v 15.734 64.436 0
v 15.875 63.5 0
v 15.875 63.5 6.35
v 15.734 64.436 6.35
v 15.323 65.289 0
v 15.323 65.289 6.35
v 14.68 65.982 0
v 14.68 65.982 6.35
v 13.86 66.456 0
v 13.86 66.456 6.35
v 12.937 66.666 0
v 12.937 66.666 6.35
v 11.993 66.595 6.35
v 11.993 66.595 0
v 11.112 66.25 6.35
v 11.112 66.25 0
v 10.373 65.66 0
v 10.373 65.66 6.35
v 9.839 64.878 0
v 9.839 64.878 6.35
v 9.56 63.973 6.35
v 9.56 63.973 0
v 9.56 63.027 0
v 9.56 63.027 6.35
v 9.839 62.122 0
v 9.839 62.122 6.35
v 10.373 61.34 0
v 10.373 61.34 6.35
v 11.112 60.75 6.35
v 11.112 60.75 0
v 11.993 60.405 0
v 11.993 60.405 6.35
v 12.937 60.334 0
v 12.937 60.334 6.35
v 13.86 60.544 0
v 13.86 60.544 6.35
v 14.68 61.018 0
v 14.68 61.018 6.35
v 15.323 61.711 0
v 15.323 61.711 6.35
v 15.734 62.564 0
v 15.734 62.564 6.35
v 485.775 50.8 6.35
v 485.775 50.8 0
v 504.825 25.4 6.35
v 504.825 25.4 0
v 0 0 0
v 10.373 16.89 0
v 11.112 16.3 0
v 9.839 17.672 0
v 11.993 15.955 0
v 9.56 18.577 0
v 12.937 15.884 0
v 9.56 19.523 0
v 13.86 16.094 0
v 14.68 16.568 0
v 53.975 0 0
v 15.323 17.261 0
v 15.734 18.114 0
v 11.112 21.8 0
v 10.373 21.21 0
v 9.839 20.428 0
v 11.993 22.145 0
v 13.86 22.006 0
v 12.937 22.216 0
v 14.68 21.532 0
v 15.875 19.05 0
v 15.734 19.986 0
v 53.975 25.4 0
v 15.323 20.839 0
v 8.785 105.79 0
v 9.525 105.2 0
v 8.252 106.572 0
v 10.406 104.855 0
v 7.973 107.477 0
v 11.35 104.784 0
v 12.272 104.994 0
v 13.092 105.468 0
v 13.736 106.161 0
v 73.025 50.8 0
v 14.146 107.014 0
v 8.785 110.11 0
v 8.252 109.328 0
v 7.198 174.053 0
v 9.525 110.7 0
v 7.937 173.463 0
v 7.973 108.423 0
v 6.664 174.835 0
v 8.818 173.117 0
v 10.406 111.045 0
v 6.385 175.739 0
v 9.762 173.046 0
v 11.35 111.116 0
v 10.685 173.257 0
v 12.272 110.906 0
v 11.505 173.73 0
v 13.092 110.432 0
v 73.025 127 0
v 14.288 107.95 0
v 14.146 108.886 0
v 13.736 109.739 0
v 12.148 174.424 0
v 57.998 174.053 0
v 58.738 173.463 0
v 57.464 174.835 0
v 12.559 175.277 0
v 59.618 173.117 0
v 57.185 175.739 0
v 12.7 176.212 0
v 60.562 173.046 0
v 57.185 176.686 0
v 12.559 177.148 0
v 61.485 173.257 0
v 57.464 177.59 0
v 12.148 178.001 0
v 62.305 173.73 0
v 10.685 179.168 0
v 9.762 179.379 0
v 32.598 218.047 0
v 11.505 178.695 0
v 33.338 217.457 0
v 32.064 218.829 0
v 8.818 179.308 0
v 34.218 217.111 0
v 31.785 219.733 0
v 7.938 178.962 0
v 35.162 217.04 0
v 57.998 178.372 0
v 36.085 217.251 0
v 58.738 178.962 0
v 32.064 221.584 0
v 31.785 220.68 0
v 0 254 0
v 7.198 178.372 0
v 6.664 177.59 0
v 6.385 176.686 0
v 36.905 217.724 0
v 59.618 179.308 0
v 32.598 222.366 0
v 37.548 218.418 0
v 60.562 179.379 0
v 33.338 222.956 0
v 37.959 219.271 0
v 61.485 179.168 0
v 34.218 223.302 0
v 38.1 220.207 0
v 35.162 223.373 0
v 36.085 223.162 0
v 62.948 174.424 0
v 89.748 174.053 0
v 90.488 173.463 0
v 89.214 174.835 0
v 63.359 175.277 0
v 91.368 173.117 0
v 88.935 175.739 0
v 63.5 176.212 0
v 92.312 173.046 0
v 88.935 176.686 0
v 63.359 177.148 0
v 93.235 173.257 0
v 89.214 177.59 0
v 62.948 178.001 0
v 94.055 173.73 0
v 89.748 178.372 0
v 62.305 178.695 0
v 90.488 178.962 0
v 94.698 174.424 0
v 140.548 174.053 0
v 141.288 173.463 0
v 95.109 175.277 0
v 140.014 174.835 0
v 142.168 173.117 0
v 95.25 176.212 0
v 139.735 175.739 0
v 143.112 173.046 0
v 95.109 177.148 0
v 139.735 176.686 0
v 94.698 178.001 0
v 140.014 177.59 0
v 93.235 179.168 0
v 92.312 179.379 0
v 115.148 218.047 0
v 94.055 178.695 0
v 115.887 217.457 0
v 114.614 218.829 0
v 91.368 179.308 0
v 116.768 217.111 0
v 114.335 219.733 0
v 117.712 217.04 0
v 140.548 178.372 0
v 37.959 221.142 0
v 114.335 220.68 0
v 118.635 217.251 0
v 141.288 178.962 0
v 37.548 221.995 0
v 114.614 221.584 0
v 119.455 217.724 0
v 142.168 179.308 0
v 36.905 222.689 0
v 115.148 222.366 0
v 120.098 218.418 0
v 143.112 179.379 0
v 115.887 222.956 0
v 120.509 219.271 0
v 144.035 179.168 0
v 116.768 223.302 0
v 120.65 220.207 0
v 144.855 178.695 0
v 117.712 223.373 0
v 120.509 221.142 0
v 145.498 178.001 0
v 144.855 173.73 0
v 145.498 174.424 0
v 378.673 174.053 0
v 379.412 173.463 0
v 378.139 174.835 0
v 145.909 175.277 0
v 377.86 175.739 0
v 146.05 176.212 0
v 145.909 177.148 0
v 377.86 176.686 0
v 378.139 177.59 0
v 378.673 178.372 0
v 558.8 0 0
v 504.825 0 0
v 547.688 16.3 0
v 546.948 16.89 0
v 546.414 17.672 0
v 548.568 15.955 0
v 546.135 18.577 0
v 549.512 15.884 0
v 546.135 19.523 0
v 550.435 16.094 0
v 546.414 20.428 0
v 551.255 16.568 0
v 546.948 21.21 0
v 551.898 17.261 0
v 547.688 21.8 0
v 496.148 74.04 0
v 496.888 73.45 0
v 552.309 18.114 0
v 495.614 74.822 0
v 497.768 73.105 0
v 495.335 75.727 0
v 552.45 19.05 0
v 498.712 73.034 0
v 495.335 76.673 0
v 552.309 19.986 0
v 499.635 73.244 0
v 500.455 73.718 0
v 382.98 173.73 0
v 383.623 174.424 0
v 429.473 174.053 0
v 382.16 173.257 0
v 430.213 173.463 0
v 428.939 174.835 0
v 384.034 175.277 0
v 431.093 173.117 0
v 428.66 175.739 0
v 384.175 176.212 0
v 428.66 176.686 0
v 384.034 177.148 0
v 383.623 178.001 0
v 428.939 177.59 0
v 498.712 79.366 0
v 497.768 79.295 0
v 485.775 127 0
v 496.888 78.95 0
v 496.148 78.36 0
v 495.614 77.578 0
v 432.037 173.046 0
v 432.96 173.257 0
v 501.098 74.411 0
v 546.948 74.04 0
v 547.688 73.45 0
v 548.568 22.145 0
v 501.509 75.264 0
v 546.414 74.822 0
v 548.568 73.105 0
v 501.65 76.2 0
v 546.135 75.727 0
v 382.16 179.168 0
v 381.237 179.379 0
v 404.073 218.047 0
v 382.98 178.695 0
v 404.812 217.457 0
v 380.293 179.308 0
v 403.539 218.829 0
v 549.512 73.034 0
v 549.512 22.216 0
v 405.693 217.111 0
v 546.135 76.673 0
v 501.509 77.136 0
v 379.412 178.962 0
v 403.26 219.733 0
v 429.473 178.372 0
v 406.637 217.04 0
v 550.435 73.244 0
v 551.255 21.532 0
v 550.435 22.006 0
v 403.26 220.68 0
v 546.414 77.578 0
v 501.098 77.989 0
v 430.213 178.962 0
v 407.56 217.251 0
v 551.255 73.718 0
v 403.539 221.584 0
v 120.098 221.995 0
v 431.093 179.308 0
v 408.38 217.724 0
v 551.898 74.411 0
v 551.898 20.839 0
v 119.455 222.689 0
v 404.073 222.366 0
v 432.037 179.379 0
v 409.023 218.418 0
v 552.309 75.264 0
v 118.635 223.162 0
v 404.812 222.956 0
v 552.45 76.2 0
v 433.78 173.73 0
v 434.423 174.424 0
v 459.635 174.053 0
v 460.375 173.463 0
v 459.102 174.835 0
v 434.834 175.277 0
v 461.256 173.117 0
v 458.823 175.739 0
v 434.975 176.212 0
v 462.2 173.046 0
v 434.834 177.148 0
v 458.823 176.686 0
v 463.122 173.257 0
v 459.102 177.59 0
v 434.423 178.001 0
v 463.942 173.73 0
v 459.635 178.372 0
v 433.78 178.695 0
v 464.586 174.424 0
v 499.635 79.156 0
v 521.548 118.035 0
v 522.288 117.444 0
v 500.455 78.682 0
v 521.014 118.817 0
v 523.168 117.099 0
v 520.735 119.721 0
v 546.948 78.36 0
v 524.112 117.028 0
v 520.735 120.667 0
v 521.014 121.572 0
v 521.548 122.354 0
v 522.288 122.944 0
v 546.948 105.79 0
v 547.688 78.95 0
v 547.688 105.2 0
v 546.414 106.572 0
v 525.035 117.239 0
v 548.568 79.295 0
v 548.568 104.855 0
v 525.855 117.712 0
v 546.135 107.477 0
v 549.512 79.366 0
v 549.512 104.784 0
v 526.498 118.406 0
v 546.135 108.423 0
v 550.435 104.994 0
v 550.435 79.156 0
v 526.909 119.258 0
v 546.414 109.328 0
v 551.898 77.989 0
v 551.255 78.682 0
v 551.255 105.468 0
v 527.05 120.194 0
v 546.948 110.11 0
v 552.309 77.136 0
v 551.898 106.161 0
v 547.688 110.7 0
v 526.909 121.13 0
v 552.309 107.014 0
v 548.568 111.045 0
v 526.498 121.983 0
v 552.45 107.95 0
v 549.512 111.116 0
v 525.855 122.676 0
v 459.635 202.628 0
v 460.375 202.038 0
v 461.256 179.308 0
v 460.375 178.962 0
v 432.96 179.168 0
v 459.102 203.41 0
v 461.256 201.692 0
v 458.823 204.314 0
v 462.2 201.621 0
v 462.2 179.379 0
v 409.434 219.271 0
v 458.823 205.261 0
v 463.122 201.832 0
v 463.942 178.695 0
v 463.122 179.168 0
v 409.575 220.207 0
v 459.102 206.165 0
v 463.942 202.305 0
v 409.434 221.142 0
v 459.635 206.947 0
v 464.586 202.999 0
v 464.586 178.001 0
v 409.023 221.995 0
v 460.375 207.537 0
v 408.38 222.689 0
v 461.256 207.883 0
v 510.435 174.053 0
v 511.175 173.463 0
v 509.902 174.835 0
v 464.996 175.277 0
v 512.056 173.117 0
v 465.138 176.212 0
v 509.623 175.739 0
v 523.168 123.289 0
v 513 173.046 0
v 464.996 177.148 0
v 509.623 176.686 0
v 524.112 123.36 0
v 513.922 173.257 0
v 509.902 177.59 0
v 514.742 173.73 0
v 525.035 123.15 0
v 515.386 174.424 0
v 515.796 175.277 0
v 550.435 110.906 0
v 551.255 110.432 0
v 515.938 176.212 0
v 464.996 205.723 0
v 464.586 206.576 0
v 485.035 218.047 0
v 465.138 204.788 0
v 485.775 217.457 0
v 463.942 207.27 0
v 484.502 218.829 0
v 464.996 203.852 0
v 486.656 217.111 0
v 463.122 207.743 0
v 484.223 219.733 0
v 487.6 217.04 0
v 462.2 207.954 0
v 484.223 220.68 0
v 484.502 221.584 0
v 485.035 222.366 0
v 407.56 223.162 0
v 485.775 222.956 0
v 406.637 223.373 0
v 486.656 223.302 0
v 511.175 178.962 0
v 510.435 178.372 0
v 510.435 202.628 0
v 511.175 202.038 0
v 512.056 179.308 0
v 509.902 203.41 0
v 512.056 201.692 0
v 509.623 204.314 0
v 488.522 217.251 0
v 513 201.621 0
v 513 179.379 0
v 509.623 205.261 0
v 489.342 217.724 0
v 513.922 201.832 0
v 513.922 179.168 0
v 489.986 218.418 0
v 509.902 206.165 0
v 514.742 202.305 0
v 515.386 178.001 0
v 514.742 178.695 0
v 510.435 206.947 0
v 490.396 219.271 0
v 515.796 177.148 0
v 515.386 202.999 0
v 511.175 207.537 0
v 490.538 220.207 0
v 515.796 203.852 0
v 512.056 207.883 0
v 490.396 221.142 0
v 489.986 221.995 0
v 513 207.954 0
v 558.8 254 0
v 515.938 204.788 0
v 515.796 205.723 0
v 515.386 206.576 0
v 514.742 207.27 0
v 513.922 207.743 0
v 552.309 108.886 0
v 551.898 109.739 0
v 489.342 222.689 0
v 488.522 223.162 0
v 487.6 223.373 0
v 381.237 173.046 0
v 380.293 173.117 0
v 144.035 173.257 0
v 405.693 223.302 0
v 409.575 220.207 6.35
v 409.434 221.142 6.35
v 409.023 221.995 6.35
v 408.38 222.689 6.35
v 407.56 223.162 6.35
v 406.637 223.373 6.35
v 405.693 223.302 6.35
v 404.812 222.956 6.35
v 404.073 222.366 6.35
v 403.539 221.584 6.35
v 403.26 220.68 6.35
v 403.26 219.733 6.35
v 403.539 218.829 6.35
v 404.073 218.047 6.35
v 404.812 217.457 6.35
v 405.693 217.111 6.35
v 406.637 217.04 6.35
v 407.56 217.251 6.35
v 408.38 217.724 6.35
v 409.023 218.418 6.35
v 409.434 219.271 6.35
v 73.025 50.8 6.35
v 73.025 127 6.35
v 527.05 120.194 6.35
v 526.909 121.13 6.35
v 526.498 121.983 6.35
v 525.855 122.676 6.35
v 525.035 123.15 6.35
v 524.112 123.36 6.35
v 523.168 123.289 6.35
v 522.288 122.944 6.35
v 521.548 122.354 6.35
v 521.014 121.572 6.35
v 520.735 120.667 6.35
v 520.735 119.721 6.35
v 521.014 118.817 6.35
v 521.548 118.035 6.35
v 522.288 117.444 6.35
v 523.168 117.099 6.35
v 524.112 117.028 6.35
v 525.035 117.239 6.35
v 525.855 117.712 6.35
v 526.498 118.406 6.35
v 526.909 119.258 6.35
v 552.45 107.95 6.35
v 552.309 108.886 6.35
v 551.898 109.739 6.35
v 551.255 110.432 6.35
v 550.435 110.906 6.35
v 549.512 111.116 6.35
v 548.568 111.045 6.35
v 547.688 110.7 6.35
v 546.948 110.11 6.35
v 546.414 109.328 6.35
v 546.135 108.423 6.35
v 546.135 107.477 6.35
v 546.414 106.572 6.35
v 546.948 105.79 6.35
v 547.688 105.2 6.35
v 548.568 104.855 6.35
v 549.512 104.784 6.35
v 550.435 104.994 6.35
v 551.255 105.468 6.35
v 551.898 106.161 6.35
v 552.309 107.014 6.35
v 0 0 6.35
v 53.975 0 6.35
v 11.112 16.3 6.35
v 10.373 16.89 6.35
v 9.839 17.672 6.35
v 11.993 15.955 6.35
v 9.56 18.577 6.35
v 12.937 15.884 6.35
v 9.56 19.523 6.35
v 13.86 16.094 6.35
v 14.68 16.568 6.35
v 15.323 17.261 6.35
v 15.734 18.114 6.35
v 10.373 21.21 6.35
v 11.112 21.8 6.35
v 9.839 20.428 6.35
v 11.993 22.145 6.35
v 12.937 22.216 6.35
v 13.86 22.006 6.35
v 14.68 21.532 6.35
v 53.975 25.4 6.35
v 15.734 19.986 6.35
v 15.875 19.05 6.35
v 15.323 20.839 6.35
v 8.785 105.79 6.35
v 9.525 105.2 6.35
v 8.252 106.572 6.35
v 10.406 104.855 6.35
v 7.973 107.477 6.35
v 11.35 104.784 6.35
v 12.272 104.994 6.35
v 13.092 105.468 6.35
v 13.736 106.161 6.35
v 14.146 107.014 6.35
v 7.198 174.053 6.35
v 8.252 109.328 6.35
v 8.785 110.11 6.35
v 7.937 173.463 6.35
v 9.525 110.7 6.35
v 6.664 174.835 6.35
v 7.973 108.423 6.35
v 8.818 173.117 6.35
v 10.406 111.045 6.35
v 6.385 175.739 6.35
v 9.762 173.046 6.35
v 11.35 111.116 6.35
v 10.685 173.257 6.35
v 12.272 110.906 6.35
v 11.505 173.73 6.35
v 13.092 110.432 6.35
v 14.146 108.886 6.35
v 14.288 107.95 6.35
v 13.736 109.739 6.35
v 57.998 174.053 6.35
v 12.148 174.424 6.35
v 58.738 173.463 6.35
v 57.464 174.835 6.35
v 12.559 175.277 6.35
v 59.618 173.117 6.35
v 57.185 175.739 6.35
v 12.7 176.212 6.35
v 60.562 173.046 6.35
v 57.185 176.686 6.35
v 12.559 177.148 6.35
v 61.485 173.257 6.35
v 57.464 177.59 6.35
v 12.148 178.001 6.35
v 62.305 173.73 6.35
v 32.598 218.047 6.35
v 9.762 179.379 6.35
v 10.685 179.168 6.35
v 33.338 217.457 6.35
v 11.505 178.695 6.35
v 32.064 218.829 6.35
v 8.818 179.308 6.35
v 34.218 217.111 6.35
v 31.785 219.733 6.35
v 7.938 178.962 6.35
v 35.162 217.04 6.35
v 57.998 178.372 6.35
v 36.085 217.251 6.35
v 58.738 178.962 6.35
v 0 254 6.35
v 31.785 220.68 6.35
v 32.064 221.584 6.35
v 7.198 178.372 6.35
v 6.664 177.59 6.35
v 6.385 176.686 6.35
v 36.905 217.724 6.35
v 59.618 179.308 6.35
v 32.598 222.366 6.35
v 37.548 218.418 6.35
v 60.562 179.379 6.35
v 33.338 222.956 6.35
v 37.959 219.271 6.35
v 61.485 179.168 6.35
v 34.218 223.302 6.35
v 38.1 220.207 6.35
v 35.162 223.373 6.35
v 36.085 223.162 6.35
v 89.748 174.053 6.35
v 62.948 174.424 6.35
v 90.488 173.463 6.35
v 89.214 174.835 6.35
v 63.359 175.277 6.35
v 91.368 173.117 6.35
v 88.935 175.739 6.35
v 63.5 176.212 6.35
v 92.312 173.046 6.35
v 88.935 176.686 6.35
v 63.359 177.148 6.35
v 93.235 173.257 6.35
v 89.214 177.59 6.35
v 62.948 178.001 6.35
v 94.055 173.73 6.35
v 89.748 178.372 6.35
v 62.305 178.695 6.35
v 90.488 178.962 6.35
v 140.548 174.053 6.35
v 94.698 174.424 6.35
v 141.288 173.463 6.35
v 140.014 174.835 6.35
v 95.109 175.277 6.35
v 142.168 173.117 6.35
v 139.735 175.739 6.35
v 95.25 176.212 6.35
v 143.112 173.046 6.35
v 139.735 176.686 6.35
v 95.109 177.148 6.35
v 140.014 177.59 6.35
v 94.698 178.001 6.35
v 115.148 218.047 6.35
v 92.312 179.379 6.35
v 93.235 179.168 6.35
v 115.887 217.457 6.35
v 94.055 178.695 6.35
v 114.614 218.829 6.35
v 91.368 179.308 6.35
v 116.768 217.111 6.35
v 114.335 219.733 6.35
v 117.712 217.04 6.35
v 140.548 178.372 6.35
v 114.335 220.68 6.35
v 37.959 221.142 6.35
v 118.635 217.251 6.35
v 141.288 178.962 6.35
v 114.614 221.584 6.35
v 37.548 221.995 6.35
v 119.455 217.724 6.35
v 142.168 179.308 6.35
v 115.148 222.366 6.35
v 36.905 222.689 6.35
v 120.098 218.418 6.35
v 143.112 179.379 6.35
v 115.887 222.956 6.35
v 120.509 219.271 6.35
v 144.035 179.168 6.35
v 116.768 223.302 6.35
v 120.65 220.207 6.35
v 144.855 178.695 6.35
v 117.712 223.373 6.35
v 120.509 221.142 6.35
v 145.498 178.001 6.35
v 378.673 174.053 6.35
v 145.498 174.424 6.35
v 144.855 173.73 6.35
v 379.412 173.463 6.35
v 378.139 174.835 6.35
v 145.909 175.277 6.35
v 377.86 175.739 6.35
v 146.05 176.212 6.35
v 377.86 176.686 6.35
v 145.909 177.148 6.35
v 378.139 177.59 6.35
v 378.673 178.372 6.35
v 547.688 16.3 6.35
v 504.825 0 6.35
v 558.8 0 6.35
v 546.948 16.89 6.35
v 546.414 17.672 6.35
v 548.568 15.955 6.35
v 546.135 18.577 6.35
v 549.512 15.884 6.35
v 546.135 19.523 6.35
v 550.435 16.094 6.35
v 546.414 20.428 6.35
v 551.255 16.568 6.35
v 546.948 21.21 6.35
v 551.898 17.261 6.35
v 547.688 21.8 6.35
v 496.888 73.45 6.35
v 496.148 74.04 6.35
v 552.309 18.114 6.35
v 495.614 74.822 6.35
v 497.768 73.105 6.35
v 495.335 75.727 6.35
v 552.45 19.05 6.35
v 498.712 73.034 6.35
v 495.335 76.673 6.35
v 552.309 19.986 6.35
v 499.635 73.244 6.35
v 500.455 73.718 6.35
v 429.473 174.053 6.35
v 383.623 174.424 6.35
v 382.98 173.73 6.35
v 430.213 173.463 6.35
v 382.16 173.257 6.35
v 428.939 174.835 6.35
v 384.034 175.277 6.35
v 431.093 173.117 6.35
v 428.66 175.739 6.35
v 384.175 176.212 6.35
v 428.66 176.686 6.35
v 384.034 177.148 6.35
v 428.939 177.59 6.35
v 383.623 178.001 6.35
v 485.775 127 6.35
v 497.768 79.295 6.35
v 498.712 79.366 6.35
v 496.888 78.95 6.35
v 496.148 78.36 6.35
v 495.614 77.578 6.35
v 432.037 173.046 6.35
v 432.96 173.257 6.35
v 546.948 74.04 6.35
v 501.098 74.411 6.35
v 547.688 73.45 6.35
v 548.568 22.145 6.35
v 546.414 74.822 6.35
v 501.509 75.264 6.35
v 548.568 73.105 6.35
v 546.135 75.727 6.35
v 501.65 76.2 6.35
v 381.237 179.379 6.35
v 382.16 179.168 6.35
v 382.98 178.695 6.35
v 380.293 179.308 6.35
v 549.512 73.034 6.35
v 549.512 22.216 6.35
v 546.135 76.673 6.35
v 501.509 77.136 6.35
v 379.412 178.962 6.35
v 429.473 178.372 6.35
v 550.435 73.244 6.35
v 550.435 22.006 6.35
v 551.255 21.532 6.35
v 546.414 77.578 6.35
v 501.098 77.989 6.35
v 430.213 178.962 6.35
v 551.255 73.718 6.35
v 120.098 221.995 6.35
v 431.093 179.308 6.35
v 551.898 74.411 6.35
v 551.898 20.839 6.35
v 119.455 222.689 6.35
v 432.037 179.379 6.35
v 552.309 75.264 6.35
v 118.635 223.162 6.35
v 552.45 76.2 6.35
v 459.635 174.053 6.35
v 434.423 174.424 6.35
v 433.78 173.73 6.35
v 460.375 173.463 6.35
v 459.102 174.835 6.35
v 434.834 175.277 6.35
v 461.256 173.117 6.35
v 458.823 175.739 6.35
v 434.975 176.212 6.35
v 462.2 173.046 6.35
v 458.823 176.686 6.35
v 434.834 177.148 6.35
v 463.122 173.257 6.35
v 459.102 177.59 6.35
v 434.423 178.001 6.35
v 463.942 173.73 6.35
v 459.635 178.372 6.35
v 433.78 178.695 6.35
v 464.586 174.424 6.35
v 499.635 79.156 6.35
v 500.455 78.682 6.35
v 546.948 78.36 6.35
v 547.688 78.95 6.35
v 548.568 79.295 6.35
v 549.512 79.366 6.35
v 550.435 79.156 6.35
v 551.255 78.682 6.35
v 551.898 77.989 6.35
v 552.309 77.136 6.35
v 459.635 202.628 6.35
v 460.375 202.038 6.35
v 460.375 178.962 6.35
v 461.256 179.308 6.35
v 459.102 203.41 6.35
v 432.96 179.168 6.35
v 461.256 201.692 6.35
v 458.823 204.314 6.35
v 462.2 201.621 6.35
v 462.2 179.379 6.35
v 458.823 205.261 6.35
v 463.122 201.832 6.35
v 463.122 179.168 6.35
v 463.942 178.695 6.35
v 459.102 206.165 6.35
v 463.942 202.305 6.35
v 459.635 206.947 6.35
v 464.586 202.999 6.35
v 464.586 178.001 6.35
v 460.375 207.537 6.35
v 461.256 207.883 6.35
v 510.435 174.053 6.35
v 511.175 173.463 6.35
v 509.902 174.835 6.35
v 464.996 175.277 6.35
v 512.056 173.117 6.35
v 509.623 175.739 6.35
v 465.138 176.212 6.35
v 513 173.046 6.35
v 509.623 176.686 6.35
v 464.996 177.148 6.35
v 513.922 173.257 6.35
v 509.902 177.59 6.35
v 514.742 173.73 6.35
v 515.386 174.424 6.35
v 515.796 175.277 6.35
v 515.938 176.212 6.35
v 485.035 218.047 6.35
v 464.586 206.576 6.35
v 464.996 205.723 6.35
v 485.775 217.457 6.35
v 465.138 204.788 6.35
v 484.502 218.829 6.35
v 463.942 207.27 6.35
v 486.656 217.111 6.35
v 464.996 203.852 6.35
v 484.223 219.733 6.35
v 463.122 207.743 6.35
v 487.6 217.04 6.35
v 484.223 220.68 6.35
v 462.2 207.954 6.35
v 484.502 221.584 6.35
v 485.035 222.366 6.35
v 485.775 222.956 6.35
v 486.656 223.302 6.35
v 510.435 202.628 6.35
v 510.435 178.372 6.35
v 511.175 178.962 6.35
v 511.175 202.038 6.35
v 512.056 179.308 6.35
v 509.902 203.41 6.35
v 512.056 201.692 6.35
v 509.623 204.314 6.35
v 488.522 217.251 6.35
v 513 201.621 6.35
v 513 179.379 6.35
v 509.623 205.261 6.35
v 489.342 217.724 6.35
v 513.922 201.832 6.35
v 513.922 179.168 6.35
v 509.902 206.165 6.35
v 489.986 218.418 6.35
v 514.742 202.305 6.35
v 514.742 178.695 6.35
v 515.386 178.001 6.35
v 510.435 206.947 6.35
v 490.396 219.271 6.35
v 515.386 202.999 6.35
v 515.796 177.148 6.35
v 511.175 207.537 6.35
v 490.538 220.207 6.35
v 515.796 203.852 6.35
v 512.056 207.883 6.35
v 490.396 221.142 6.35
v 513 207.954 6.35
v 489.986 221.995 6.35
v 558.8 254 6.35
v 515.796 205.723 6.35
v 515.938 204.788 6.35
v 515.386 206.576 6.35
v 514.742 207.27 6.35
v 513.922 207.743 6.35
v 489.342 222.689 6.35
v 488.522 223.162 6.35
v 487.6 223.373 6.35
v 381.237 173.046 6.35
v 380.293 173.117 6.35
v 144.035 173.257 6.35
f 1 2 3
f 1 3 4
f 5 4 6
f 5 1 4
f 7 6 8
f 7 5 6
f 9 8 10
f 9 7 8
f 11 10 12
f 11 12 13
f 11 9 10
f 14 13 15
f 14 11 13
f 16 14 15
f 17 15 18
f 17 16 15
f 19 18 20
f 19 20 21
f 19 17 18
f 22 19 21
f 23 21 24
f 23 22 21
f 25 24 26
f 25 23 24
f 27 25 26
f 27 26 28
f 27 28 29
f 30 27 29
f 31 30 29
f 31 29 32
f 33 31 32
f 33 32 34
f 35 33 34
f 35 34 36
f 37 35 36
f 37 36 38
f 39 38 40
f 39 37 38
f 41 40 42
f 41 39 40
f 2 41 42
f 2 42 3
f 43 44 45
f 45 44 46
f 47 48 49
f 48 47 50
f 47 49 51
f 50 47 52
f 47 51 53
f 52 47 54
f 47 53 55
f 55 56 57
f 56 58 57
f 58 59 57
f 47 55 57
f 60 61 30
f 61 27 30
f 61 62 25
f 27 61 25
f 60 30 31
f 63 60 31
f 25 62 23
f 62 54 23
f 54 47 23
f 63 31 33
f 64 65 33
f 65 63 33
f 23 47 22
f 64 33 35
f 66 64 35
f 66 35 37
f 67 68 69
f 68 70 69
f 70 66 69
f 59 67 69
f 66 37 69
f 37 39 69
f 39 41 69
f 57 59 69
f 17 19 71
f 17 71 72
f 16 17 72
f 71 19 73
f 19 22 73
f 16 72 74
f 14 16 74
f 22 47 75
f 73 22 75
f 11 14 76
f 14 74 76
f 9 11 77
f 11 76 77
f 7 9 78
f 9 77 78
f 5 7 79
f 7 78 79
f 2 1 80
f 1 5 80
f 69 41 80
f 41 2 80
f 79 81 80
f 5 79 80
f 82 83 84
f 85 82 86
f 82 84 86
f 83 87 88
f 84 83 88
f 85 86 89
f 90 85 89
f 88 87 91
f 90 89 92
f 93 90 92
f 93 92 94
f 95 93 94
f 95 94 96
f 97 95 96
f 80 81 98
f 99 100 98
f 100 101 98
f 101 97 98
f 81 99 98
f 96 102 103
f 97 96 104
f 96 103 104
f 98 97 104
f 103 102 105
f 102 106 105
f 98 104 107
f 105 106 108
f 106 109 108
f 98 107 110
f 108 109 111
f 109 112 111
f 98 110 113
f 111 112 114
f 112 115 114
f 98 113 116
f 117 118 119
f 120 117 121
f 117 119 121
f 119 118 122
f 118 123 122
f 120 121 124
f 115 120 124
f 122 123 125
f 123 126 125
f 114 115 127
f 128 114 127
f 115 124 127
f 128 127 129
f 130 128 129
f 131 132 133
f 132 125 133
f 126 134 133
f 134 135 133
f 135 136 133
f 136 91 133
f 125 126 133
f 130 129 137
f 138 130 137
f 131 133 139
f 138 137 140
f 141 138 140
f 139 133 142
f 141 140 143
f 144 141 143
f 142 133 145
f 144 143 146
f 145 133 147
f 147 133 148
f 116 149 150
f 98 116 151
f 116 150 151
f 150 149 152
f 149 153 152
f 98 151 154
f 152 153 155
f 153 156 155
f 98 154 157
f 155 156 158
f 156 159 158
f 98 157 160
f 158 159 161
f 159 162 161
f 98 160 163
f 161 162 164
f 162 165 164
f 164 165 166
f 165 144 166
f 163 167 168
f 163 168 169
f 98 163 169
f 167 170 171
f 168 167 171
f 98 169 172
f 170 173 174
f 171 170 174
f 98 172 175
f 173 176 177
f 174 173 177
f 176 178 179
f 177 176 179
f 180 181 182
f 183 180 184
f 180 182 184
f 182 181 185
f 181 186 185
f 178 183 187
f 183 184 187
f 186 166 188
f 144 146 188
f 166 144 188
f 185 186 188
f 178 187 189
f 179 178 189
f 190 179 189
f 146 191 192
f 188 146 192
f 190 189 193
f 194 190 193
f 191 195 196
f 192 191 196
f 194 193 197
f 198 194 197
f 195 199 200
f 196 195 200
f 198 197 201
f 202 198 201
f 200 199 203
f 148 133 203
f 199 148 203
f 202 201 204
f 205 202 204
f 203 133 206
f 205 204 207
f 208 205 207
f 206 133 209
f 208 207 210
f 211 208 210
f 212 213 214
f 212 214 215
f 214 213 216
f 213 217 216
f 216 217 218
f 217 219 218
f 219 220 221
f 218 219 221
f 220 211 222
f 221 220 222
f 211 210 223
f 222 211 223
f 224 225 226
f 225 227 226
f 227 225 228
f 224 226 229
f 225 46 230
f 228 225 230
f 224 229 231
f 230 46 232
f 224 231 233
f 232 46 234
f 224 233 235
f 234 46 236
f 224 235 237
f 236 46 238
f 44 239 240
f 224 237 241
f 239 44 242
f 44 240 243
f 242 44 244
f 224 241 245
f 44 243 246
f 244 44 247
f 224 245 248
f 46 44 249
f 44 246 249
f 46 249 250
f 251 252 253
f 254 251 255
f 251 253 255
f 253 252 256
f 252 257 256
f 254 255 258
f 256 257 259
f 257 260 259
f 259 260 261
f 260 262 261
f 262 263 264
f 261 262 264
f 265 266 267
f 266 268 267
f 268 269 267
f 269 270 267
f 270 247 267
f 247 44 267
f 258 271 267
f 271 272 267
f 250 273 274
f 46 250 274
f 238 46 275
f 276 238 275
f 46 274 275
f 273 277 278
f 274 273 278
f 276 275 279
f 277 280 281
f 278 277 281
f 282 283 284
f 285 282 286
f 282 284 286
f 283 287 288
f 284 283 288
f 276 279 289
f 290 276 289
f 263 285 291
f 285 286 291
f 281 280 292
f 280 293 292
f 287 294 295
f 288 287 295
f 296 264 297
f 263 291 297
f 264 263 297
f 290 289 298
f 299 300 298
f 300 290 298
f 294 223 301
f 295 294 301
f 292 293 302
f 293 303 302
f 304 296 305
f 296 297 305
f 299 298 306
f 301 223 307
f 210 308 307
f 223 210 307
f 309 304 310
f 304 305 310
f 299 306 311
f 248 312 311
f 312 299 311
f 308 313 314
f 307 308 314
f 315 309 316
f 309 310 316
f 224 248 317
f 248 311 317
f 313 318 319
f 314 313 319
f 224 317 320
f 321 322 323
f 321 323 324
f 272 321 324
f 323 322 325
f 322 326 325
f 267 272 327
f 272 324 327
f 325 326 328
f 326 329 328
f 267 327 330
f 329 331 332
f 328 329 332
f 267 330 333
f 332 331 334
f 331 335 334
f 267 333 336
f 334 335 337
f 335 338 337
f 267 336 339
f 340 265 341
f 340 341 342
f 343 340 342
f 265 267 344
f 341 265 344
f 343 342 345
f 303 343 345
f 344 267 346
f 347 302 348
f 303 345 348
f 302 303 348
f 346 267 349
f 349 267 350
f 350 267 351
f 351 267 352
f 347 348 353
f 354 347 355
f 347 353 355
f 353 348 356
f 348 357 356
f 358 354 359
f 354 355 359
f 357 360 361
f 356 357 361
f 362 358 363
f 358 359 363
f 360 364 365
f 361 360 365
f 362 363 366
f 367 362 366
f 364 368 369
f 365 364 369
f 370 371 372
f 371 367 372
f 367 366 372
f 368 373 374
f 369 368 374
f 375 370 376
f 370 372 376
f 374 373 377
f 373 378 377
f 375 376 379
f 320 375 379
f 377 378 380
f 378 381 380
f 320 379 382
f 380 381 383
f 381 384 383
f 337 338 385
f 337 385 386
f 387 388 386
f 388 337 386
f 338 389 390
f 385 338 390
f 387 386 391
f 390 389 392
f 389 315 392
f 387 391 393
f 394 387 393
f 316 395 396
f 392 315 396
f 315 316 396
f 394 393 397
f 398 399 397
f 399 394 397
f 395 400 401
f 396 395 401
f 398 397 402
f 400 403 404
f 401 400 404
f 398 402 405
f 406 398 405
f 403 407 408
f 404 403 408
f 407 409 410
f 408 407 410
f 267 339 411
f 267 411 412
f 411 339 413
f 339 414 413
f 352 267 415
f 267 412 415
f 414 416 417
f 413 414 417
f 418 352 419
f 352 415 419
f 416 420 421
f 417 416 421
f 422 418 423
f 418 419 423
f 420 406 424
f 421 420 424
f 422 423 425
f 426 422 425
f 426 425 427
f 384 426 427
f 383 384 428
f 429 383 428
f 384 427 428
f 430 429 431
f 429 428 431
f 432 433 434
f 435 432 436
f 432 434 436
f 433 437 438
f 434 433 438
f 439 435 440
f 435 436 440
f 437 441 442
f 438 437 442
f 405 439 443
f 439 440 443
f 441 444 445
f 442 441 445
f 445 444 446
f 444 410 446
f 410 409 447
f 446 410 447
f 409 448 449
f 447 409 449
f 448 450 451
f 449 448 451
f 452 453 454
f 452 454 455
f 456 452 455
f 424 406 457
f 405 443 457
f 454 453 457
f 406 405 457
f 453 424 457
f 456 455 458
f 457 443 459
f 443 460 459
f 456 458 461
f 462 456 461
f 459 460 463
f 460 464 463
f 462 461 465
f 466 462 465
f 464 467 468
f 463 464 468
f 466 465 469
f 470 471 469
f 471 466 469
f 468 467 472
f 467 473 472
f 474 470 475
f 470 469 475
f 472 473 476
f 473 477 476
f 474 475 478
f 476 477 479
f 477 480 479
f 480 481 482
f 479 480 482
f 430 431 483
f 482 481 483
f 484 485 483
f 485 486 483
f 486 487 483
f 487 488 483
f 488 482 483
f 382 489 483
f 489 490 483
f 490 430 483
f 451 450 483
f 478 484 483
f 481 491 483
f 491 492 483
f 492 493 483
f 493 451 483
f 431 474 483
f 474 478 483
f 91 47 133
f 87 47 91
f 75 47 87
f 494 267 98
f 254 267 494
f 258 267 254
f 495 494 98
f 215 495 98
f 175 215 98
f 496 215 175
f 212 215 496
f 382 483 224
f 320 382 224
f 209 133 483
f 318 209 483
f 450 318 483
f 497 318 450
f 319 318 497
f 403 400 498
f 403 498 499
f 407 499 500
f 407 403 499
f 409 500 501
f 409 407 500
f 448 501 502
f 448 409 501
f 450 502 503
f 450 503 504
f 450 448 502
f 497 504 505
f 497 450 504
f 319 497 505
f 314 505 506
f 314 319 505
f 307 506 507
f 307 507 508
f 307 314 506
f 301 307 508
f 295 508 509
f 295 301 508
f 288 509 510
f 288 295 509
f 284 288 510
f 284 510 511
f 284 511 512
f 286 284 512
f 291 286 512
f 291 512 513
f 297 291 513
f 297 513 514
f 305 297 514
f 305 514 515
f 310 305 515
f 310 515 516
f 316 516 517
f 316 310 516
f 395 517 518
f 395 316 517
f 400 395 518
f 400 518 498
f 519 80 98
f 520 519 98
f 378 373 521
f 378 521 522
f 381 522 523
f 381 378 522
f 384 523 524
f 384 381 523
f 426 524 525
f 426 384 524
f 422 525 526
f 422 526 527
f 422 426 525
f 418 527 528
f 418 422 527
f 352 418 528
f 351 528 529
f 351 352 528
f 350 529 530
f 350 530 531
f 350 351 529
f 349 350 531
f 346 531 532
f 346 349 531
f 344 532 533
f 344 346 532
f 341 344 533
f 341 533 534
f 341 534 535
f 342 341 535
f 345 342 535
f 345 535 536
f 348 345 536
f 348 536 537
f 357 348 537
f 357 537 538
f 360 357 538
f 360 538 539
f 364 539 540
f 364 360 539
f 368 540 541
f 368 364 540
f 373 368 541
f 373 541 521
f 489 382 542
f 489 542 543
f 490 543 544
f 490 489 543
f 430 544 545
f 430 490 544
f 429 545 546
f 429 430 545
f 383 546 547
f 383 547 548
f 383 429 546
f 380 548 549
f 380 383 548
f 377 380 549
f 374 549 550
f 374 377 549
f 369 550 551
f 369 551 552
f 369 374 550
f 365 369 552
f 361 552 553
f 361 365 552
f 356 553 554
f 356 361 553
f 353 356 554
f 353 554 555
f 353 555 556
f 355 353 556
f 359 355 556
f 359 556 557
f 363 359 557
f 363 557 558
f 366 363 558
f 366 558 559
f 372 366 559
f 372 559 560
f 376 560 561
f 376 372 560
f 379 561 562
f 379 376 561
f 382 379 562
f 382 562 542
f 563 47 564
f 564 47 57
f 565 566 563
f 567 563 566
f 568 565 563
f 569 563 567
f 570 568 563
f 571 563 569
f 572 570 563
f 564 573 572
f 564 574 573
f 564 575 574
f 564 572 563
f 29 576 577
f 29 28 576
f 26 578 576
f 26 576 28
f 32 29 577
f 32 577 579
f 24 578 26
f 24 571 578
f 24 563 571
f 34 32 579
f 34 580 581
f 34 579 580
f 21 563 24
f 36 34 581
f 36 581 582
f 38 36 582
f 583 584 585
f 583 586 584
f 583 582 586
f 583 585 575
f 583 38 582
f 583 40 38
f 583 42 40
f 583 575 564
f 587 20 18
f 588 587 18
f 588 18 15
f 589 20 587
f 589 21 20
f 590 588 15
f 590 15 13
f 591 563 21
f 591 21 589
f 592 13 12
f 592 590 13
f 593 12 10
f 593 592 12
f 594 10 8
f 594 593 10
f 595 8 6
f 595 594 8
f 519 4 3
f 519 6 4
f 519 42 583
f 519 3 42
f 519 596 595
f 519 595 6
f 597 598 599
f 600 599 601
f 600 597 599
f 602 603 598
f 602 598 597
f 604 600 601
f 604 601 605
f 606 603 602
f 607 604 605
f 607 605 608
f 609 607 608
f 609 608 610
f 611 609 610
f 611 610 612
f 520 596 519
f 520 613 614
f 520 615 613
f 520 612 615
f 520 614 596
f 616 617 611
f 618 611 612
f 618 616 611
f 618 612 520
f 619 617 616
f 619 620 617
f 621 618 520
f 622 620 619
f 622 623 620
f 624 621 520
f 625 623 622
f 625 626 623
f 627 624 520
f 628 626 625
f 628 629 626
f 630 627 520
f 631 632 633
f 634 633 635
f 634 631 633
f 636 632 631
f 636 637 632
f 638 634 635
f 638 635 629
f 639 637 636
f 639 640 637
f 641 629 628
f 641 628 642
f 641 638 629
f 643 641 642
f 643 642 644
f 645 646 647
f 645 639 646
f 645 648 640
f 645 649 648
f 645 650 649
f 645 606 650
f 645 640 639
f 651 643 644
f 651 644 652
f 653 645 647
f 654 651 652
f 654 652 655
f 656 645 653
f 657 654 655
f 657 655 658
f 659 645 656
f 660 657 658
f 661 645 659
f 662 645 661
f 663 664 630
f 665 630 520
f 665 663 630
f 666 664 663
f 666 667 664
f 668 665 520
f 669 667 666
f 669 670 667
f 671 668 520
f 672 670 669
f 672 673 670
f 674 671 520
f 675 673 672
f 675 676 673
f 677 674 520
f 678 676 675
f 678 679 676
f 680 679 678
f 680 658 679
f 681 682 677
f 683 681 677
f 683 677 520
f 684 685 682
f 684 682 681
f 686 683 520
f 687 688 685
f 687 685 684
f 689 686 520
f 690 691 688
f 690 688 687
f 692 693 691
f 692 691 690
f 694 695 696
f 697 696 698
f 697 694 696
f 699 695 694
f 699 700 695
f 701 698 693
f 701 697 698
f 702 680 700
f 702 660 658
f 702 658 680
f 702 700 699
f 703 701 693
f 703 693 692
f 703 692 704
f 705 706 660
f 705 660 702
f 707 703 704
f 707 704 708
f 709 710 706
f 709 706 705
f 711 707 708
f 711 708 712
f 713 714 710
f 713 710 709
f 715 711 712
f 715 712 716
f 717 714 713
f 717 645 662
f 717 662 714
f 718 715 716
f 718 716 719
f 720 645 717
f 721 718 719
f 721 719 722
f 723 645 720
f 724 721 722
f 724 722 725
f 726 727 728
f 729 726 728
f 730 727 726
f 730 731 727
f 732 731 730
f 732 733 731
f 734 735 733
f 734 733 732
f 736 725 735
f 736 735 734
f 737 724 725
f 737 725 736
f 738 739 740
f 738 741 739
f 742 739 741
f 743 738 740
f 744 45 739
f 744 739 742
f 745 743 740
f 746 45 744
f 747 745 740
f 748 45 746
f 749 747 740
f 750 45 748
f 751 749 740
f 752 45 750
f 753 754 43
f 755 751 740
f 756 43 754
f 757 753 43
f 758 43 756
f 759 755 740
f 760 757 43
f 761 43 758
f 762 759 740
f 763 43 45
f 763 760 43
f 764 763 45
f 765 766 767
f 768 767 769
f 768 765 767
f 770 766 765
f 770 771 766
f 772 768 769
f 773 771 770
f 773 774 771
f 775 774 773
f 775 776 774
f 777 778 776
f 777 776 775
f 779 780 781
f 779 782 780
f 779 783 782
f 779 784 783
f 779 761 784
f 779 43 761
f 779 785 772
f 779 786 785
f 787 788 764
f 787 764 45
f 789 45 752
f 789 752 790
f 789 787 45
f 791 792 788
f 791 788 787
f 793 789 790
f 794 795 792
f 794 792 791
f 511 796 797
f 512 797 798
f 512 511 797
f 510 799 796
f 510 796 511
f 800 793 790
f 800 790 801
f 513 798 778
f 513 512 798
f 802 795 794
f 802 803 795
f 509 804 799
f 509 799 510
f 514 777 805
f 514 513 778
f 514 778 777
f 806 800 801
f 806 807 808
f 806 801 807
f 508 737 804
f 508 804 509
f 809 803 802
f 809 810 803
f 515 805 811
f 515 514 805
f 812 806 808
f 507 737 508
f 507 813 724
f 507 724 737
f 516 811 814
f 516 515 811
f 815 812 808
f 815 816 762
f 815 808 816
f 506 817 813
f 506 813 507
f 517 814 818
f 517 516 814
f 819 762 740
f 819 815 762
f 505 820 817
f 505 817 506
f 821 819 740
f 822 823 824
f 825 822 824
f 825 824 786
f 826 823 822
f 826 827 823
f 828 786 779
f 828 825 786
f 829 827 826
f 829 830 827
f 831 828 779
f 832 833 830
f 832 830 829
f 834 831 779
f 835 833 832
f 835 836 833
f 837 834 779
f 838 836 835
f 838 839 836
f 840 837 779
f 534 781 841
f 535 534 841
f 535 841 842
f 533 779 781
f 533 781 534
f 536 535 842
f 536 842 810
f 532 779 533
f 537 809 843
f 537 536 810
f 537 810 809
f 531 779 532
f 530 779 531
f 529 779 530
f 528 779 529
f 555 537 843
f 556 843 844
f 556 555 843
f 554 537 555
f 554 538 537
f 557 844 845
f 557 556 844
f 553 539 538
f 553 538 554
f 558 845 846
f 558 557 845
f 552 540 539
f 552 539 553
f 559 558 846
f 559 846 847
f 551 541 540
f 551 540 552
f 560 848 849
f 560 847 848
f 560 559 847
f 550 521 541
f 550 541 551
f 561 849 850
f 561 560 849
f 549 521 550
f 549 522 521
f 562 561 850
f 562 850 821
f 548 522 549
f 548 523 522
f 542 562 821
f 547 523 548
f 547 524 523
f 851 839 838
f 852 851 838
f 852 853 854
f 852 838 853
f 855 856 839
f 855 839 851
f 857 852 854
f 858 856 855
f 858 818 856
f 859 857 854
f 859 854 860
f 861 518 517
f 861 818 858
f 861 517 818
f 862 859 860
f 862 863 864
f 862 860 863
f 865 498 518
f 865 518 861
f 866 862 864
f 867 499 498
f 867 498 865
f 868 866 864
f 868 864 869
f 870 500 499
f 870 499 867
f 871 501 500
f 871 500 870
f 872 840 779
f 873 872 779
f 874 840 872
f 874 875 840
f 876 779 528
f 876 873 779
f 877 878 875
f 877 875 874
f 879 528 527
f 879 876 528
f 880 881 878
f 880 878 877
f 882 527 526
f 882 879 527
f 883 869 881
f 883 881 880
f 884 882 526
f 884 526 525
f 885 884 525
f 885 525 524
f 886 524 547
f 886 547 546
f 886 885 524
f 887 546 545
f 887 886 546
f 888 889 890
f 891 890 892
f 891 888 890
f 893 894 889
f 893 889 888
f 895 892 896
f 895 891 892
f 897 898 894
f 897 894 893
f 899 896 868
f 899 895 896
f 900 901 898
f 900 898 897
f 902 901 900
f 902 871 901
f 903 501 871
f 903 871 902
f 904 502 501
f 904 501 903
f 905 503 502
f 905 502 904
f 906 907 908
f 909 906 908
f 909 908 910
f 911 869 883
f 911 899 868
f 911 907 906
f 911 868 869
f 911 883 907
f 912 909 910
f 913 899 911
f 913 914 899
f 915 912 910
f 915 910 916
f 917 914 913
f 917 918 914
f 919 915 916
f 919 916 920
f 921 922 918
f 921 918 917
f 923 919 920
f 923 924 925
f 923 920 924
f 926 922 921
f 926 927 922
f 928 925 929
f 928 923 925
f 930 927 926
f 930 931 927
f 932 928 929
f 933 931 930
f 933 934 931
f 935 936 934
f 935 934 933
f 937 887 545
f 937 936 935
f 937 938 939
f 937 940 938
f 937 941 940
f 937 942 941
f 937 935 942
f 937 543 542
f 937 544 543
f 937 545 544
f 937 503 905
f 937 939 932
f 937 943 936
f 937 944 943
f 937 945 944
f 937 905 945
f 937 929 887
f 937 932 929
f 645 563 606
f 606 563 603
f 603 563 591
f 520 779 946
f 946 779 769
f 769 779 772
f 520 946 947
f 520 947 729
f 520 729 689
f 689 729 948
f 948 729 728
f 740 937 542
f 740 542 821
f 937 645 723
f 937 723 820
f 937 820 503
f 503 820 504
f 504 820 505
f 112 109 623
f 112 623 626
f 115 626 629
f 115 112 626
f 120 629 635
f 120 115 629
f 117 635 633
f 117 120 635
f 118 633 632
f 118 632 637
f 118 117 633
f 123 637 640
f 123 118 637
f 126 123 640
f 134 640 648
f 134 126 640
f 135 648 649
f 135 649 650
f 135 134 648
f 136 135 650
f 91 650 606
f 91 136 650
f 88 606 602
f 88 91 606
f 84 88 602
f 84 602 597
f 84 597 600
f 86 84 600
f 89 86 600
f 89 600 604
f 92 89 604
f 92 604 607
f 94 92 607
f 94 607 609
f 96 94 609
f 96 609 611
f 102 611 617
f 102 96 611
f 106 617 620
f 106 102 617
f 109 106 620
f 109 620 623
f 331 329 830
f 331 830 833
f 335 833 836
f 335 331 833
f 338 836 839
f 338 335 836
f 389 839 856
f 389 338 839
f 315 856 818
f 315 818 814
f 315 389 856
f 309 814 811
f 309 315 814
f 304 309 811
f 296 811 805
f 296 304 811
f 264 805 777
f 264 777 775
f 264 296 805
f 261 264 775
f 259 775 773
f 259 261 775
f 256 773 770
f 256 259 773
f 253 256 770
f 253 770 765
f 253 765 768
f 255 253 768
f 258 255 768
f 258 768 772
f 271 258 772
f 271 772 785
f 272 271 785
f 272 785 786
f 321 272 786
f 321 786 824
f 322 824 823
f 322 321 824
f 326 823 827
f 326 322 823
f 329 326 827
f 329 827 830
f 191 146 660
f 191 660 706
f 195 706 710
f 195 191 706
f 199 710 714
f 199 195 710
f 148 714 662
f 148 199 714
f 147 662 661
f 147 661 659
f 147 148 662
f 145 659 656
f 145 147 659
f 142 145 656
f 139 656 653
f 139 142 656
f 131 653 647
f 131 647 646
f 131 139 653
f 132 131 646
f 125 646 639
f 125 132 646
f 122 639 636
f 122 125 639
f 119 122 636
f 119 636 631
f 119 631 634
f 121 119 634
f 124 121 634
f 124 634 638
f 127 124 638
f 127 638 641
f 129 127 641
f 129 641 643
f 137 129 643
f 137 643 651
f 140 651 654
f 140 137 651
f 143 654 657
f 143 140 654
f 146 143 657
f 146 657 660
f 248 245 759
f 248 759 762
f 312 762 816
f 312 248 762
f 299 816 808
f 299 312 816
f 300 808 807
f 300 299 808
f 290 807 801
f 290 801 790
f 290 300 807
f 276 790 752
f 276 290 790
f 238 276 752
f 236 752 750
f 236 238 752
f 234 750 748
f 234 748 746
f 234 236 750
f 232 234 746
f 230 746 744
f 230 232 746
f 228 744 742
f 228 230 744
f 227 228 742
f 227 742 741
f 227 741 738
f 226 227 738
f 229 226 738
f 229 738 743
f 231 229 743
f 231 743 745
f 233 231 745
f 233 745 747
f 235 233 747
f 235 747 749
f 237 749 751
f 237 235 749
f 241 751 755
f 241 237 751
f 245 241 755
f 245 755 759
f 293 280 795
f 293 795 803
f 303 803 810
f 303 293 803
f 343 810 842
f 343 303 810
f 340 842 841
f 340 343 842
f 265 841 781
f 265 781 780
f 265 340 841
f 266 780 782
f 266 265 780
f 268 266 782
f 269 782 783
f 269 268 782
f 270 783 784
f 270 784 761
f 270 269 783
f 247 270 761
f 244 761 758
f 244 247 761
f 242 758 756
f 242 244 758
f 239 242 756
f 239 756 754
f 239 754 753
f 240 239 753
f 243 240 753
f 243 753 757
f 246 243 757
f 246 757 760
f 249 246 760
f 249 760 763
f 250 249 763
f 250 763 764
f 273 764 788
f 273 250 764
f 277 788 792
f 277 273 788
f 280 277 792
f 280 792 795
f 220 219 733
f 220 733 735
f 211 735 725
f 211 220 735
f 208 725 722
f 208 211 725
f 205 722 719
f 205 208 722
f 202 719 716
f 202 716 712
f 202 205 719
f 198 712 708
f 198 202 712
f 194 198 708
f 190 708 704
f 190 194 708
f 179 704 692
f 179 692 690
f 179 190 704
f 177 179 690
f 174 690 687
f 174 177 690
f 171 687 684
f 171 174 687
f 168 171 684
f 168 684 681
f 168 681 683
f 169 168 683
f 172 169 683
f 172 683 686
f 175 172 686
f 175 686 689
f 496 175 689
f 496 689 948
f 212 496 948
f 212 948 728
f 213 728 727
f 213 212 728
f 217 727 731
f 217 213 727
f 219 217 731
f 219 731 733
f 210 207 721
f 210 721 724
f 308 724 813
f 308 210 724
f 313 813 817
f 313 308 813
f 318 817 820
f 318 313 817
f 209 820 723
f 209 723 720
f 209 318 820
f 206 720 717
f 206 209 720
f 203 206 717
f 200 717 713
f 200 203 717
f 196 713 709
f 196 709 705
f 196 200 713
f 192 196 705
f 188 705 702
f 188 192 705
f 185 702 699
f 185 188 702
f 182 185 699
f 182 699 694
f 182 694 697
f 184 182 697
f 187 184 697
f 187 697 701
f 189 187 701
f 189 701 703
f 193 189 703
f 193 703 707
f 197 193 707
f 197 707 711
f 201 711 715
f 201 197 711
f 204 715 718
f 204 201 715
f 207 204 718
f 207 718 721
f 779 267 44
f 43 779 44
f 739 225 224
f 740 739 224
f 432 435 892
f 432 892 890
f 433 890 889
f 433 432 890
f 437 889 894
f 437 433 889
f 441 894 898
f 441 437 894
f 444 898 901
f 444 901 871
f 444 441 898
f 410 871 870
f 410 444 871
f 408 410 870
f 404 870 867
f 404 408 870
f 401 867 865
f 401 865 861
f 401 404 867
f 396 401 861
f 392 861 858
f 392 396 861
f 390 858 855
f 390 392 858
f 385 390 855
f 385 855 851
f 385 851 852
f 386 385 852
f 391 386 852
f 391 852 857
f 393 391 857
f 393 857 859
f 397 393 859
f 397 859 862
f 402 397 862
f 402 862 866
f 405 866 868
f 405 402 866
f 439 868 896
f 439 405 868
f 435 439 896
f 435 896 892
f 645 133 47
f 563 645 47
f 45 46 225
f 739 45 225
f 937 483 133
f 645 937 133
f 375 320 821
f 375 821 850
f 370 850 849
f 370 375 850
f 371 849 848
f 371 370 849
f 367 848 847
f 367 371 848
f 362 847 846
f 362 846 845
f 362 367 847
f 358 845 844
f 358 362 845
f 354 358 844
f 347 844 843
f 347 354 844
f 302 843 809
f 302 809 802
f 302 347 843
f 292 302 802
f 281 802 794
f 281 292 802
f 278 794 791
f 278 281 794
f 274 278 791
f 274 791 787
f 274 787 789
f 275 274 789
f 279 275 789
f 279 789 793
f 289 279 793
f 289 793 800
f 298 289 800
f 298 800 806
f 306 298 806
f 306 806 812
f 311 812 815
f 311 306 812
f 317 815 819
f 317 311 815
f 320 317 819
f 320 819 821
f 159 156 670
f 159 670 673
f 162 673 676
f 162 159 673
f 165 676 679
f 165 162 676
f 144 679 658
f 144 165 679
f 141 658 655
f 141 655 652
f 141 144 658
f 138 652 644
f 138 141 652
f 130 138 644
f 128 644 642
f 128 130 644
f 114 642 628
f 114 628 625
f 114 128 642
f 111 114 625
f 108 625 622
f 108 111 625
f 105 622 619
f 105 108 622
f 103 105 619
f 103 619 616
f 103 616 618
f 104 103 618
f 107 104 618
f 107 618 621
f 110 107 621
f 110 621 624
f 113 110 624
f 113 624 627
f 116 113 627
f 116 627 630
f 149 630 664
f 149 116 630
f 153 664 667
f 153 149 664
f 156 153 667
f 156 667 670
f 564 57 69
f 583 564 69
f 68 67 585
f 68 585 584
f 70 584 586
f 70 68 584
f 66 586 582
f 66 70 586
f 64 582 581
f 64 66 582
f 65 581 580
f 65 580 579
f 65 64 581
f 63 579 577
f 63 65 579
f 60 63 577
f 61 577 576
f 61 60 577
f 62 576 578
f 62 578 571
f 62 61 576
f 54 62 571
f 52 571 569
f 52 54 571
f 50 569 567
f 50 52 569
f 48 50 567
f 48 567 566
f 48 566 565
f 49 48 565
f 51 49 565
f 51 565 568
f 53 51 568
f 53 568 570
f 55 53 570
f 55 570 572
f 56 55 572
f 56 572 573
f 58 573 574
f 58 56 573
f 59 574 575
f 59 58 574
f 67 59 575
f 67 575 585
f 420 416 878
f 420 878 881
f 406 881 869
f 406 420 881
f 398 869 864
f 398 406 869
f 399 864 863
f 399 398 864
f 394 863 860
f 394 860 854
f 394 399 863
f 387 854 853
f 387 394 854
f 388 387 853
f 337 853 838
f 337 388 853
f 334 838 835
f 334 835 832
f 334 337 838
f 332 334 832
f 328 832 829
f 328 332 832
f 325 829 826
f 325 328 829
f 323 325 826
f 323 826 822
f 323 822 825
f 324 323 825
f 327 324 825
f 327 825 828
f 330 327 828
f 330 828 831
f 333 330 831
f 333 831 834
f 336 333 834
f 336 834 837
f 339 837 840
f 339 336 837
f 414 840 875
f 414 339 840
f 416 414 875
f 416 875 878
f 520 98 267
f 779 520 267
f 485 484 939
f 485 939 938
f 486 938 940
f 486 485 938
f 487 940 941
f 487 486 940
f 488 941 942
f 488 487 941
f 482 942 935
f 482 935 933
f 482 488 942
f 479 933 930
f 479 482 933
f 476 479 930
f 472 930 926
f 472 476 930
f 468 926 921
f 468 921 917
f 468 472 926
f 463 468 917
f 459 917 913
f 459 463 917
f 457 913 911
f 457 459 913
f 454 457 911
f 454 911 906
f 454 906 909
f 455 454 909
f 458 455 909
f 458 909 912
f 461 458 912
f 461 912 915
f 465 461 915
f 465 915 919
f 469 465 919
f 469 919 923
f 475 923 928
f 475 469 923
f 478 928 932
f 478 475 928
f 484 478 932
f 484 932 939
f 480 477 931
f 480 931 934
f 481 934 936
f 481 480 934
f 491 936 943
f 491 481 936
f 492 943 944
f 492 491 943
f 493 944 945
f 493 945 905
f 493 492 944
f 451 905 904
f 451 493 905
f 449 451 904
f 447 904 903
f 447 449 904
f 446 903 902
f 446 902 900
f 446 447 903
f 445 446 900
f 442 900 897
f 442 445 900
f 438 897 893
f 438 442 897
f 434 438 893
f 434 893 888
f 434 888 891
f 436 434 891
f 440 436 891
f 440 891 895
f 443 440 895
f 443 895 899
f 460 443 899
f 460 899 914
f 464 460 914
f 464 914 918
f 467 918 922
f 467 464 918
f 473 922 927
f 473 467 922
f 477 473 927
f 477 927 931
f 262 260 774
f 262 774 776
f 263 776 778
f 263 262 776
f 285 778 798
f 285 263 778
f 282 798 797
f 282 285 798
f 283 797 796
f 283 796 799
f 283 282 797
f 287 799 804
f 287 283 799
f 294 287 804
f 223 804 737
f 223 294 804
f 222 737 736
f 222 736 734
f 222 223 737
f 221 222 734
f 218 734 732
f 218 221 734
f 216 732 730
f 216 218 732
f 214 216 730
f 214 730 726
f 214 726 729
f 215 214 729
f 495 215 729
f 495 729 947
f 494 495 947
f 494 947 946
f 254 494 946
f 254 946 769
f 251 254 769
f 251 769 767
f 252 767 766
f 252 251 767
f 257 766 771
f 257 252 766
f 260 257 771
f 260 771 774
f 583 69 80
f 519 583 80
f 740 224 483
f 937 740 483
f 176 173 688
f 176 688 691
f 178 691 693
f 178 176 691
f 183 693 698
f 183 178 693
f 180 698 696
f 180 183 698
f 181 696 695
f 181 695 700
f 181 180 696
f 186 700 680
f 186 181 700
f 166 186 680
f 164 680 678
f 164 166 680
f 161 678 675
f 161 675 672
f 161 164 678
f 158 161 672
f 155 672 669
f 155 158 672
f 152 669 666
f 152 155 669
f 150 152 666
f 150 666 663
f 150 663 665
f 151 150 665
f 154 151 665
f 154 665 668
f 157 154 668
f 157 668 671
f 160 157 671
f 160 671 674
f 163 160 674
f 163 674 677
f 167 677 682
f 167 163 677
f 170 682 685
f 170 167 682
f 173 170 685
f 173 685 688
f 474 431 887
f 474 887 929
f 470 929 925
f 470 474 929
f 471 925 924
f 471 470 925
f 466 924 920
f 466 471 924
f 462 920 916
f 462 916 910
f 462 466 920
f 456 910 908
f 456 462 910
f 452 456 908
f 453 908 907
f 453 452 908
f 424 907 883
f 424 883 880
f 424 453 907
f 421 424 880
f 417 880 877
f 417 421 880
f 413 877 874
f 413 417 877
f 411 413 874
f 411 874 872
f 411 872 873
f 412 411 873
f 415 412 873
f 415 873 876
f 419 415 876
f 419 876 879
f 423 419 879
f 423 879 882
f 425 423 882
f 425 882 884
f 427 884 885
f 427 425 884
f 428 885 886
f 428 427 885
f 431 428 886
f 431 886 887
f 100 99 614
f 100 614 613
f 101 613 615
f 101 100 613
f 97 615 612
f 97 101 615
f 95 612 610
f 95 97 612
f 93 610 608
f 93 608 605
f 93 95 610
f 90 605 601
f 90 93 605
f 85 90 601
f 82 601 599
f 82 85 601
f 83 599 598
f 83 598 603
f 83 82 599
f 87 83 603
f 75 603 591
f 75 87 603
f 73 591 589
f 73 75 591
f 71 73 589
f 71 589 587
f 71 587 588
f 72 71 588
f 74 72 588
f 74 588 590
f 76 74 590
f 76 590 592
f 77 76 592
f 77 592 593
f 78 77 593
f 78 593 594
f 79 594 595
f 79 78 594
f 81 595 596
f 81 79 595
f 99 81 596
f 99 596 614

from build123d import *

# Parameters (mm, degrees)
F0_R     = 3.175
F1_DEPTH = 6.35


with BuildPart() as f1:
    # F0 (on Top) → F1 (new body)
    with BuildSketch(Plane.XY):
        Polygon((0, 254), (0, 0), (53.975, 0), (53.975, 25.4), (73.025, 50.8), (73.025, 127), (485.775, 127), (485.775, 50.8), (504.825, 25.4), (504.825, 0), (558.8, 0), (558.8, 254), align=None)
        with Locations((12.7, 19.05)):
            Circle(F0_R, mode=Mode.SUBTRACT)
        with Locations((12.7, 63.5)):
            Circle(F0_R, mode=Mode.SUBTRACT)
        with Locations((11.1125, 107.95)):
            Circle(F0_R, mode=Mode.SUBTRACT)
        with Locations((549.275, 19.05)):
            Circle(F0_R, mode=Mode.SUBTRACT)
        with Locations((498.475, 76.2)):
            Circle(F0_R, mode=Mode.SUBTRACT)
        with Locations((549.275, 76.2)):
            Circle(F0_R, mode=Mode.SUBTRACT)
        with Locations((549.275, 107.95)):
            Circle(F0_R, mode=Mode.SUBTRACT)
        with Locations((523.875, 120.194091)):
            Circle(F0_R, mode=Mode.SUBTRACT)
        with Locations((9.525, 176.2125)):
            Circle(F0_R, mode=Mode.SUBTRACT)
        with Locations((60.325, 176.2125)):
            Circle(F0_R, mode=Mode.SUBTRACT)
        with Locations((92.075, 176.2125)):
            Circle(F0_R, mode=Mode.SUBTRACT)
        with Locations((142.875, 176.2125)):
            Circle(F0_R, mode=Mode.SUBTRACT)
        with Locations((34.925, 220.206591)):
            Circle(F0_R, mode=Mode.SUBTRACT)
        with Locations((117.475, 220.206591)):
            Circle(F0_R, mode=Mode.SUBTRACT)
        with Locations((381, 176.2125)):
            Circle(F0_R, mode=Mode.SUBTRACT)
        with Locations((431.8, 176.2125)):
            Circle(F0_R, mode=Mode.SUBTRACT)
        with Locations((461.9625, 176.2125)):
            Circle(F0_R, mode=Mode.SUBTRACT)
        with Locations((512.7625, 176.2125)):
            Circle(F0_R, mode=Mode.SUBTRACT)
        with Locations((406.4, 220.206591)):
            Circle(F0_R, mode=Mode.SUBTRACT)
        with Locations((461.9625, 204.7875)):
            Circle(F0_R, mode=Mode.SUBTRACT)
        with Locations((487.3625, 220.206591)):
            Circle(F0_R, mode=Mode.SUBTRACT)
        with Locations((512.7625, 204.7875)):
            Circle(F0_R, mode=Mode.SUBTRACT)
    extrude(amount=F1_DEPTH)


solid = f1.part
